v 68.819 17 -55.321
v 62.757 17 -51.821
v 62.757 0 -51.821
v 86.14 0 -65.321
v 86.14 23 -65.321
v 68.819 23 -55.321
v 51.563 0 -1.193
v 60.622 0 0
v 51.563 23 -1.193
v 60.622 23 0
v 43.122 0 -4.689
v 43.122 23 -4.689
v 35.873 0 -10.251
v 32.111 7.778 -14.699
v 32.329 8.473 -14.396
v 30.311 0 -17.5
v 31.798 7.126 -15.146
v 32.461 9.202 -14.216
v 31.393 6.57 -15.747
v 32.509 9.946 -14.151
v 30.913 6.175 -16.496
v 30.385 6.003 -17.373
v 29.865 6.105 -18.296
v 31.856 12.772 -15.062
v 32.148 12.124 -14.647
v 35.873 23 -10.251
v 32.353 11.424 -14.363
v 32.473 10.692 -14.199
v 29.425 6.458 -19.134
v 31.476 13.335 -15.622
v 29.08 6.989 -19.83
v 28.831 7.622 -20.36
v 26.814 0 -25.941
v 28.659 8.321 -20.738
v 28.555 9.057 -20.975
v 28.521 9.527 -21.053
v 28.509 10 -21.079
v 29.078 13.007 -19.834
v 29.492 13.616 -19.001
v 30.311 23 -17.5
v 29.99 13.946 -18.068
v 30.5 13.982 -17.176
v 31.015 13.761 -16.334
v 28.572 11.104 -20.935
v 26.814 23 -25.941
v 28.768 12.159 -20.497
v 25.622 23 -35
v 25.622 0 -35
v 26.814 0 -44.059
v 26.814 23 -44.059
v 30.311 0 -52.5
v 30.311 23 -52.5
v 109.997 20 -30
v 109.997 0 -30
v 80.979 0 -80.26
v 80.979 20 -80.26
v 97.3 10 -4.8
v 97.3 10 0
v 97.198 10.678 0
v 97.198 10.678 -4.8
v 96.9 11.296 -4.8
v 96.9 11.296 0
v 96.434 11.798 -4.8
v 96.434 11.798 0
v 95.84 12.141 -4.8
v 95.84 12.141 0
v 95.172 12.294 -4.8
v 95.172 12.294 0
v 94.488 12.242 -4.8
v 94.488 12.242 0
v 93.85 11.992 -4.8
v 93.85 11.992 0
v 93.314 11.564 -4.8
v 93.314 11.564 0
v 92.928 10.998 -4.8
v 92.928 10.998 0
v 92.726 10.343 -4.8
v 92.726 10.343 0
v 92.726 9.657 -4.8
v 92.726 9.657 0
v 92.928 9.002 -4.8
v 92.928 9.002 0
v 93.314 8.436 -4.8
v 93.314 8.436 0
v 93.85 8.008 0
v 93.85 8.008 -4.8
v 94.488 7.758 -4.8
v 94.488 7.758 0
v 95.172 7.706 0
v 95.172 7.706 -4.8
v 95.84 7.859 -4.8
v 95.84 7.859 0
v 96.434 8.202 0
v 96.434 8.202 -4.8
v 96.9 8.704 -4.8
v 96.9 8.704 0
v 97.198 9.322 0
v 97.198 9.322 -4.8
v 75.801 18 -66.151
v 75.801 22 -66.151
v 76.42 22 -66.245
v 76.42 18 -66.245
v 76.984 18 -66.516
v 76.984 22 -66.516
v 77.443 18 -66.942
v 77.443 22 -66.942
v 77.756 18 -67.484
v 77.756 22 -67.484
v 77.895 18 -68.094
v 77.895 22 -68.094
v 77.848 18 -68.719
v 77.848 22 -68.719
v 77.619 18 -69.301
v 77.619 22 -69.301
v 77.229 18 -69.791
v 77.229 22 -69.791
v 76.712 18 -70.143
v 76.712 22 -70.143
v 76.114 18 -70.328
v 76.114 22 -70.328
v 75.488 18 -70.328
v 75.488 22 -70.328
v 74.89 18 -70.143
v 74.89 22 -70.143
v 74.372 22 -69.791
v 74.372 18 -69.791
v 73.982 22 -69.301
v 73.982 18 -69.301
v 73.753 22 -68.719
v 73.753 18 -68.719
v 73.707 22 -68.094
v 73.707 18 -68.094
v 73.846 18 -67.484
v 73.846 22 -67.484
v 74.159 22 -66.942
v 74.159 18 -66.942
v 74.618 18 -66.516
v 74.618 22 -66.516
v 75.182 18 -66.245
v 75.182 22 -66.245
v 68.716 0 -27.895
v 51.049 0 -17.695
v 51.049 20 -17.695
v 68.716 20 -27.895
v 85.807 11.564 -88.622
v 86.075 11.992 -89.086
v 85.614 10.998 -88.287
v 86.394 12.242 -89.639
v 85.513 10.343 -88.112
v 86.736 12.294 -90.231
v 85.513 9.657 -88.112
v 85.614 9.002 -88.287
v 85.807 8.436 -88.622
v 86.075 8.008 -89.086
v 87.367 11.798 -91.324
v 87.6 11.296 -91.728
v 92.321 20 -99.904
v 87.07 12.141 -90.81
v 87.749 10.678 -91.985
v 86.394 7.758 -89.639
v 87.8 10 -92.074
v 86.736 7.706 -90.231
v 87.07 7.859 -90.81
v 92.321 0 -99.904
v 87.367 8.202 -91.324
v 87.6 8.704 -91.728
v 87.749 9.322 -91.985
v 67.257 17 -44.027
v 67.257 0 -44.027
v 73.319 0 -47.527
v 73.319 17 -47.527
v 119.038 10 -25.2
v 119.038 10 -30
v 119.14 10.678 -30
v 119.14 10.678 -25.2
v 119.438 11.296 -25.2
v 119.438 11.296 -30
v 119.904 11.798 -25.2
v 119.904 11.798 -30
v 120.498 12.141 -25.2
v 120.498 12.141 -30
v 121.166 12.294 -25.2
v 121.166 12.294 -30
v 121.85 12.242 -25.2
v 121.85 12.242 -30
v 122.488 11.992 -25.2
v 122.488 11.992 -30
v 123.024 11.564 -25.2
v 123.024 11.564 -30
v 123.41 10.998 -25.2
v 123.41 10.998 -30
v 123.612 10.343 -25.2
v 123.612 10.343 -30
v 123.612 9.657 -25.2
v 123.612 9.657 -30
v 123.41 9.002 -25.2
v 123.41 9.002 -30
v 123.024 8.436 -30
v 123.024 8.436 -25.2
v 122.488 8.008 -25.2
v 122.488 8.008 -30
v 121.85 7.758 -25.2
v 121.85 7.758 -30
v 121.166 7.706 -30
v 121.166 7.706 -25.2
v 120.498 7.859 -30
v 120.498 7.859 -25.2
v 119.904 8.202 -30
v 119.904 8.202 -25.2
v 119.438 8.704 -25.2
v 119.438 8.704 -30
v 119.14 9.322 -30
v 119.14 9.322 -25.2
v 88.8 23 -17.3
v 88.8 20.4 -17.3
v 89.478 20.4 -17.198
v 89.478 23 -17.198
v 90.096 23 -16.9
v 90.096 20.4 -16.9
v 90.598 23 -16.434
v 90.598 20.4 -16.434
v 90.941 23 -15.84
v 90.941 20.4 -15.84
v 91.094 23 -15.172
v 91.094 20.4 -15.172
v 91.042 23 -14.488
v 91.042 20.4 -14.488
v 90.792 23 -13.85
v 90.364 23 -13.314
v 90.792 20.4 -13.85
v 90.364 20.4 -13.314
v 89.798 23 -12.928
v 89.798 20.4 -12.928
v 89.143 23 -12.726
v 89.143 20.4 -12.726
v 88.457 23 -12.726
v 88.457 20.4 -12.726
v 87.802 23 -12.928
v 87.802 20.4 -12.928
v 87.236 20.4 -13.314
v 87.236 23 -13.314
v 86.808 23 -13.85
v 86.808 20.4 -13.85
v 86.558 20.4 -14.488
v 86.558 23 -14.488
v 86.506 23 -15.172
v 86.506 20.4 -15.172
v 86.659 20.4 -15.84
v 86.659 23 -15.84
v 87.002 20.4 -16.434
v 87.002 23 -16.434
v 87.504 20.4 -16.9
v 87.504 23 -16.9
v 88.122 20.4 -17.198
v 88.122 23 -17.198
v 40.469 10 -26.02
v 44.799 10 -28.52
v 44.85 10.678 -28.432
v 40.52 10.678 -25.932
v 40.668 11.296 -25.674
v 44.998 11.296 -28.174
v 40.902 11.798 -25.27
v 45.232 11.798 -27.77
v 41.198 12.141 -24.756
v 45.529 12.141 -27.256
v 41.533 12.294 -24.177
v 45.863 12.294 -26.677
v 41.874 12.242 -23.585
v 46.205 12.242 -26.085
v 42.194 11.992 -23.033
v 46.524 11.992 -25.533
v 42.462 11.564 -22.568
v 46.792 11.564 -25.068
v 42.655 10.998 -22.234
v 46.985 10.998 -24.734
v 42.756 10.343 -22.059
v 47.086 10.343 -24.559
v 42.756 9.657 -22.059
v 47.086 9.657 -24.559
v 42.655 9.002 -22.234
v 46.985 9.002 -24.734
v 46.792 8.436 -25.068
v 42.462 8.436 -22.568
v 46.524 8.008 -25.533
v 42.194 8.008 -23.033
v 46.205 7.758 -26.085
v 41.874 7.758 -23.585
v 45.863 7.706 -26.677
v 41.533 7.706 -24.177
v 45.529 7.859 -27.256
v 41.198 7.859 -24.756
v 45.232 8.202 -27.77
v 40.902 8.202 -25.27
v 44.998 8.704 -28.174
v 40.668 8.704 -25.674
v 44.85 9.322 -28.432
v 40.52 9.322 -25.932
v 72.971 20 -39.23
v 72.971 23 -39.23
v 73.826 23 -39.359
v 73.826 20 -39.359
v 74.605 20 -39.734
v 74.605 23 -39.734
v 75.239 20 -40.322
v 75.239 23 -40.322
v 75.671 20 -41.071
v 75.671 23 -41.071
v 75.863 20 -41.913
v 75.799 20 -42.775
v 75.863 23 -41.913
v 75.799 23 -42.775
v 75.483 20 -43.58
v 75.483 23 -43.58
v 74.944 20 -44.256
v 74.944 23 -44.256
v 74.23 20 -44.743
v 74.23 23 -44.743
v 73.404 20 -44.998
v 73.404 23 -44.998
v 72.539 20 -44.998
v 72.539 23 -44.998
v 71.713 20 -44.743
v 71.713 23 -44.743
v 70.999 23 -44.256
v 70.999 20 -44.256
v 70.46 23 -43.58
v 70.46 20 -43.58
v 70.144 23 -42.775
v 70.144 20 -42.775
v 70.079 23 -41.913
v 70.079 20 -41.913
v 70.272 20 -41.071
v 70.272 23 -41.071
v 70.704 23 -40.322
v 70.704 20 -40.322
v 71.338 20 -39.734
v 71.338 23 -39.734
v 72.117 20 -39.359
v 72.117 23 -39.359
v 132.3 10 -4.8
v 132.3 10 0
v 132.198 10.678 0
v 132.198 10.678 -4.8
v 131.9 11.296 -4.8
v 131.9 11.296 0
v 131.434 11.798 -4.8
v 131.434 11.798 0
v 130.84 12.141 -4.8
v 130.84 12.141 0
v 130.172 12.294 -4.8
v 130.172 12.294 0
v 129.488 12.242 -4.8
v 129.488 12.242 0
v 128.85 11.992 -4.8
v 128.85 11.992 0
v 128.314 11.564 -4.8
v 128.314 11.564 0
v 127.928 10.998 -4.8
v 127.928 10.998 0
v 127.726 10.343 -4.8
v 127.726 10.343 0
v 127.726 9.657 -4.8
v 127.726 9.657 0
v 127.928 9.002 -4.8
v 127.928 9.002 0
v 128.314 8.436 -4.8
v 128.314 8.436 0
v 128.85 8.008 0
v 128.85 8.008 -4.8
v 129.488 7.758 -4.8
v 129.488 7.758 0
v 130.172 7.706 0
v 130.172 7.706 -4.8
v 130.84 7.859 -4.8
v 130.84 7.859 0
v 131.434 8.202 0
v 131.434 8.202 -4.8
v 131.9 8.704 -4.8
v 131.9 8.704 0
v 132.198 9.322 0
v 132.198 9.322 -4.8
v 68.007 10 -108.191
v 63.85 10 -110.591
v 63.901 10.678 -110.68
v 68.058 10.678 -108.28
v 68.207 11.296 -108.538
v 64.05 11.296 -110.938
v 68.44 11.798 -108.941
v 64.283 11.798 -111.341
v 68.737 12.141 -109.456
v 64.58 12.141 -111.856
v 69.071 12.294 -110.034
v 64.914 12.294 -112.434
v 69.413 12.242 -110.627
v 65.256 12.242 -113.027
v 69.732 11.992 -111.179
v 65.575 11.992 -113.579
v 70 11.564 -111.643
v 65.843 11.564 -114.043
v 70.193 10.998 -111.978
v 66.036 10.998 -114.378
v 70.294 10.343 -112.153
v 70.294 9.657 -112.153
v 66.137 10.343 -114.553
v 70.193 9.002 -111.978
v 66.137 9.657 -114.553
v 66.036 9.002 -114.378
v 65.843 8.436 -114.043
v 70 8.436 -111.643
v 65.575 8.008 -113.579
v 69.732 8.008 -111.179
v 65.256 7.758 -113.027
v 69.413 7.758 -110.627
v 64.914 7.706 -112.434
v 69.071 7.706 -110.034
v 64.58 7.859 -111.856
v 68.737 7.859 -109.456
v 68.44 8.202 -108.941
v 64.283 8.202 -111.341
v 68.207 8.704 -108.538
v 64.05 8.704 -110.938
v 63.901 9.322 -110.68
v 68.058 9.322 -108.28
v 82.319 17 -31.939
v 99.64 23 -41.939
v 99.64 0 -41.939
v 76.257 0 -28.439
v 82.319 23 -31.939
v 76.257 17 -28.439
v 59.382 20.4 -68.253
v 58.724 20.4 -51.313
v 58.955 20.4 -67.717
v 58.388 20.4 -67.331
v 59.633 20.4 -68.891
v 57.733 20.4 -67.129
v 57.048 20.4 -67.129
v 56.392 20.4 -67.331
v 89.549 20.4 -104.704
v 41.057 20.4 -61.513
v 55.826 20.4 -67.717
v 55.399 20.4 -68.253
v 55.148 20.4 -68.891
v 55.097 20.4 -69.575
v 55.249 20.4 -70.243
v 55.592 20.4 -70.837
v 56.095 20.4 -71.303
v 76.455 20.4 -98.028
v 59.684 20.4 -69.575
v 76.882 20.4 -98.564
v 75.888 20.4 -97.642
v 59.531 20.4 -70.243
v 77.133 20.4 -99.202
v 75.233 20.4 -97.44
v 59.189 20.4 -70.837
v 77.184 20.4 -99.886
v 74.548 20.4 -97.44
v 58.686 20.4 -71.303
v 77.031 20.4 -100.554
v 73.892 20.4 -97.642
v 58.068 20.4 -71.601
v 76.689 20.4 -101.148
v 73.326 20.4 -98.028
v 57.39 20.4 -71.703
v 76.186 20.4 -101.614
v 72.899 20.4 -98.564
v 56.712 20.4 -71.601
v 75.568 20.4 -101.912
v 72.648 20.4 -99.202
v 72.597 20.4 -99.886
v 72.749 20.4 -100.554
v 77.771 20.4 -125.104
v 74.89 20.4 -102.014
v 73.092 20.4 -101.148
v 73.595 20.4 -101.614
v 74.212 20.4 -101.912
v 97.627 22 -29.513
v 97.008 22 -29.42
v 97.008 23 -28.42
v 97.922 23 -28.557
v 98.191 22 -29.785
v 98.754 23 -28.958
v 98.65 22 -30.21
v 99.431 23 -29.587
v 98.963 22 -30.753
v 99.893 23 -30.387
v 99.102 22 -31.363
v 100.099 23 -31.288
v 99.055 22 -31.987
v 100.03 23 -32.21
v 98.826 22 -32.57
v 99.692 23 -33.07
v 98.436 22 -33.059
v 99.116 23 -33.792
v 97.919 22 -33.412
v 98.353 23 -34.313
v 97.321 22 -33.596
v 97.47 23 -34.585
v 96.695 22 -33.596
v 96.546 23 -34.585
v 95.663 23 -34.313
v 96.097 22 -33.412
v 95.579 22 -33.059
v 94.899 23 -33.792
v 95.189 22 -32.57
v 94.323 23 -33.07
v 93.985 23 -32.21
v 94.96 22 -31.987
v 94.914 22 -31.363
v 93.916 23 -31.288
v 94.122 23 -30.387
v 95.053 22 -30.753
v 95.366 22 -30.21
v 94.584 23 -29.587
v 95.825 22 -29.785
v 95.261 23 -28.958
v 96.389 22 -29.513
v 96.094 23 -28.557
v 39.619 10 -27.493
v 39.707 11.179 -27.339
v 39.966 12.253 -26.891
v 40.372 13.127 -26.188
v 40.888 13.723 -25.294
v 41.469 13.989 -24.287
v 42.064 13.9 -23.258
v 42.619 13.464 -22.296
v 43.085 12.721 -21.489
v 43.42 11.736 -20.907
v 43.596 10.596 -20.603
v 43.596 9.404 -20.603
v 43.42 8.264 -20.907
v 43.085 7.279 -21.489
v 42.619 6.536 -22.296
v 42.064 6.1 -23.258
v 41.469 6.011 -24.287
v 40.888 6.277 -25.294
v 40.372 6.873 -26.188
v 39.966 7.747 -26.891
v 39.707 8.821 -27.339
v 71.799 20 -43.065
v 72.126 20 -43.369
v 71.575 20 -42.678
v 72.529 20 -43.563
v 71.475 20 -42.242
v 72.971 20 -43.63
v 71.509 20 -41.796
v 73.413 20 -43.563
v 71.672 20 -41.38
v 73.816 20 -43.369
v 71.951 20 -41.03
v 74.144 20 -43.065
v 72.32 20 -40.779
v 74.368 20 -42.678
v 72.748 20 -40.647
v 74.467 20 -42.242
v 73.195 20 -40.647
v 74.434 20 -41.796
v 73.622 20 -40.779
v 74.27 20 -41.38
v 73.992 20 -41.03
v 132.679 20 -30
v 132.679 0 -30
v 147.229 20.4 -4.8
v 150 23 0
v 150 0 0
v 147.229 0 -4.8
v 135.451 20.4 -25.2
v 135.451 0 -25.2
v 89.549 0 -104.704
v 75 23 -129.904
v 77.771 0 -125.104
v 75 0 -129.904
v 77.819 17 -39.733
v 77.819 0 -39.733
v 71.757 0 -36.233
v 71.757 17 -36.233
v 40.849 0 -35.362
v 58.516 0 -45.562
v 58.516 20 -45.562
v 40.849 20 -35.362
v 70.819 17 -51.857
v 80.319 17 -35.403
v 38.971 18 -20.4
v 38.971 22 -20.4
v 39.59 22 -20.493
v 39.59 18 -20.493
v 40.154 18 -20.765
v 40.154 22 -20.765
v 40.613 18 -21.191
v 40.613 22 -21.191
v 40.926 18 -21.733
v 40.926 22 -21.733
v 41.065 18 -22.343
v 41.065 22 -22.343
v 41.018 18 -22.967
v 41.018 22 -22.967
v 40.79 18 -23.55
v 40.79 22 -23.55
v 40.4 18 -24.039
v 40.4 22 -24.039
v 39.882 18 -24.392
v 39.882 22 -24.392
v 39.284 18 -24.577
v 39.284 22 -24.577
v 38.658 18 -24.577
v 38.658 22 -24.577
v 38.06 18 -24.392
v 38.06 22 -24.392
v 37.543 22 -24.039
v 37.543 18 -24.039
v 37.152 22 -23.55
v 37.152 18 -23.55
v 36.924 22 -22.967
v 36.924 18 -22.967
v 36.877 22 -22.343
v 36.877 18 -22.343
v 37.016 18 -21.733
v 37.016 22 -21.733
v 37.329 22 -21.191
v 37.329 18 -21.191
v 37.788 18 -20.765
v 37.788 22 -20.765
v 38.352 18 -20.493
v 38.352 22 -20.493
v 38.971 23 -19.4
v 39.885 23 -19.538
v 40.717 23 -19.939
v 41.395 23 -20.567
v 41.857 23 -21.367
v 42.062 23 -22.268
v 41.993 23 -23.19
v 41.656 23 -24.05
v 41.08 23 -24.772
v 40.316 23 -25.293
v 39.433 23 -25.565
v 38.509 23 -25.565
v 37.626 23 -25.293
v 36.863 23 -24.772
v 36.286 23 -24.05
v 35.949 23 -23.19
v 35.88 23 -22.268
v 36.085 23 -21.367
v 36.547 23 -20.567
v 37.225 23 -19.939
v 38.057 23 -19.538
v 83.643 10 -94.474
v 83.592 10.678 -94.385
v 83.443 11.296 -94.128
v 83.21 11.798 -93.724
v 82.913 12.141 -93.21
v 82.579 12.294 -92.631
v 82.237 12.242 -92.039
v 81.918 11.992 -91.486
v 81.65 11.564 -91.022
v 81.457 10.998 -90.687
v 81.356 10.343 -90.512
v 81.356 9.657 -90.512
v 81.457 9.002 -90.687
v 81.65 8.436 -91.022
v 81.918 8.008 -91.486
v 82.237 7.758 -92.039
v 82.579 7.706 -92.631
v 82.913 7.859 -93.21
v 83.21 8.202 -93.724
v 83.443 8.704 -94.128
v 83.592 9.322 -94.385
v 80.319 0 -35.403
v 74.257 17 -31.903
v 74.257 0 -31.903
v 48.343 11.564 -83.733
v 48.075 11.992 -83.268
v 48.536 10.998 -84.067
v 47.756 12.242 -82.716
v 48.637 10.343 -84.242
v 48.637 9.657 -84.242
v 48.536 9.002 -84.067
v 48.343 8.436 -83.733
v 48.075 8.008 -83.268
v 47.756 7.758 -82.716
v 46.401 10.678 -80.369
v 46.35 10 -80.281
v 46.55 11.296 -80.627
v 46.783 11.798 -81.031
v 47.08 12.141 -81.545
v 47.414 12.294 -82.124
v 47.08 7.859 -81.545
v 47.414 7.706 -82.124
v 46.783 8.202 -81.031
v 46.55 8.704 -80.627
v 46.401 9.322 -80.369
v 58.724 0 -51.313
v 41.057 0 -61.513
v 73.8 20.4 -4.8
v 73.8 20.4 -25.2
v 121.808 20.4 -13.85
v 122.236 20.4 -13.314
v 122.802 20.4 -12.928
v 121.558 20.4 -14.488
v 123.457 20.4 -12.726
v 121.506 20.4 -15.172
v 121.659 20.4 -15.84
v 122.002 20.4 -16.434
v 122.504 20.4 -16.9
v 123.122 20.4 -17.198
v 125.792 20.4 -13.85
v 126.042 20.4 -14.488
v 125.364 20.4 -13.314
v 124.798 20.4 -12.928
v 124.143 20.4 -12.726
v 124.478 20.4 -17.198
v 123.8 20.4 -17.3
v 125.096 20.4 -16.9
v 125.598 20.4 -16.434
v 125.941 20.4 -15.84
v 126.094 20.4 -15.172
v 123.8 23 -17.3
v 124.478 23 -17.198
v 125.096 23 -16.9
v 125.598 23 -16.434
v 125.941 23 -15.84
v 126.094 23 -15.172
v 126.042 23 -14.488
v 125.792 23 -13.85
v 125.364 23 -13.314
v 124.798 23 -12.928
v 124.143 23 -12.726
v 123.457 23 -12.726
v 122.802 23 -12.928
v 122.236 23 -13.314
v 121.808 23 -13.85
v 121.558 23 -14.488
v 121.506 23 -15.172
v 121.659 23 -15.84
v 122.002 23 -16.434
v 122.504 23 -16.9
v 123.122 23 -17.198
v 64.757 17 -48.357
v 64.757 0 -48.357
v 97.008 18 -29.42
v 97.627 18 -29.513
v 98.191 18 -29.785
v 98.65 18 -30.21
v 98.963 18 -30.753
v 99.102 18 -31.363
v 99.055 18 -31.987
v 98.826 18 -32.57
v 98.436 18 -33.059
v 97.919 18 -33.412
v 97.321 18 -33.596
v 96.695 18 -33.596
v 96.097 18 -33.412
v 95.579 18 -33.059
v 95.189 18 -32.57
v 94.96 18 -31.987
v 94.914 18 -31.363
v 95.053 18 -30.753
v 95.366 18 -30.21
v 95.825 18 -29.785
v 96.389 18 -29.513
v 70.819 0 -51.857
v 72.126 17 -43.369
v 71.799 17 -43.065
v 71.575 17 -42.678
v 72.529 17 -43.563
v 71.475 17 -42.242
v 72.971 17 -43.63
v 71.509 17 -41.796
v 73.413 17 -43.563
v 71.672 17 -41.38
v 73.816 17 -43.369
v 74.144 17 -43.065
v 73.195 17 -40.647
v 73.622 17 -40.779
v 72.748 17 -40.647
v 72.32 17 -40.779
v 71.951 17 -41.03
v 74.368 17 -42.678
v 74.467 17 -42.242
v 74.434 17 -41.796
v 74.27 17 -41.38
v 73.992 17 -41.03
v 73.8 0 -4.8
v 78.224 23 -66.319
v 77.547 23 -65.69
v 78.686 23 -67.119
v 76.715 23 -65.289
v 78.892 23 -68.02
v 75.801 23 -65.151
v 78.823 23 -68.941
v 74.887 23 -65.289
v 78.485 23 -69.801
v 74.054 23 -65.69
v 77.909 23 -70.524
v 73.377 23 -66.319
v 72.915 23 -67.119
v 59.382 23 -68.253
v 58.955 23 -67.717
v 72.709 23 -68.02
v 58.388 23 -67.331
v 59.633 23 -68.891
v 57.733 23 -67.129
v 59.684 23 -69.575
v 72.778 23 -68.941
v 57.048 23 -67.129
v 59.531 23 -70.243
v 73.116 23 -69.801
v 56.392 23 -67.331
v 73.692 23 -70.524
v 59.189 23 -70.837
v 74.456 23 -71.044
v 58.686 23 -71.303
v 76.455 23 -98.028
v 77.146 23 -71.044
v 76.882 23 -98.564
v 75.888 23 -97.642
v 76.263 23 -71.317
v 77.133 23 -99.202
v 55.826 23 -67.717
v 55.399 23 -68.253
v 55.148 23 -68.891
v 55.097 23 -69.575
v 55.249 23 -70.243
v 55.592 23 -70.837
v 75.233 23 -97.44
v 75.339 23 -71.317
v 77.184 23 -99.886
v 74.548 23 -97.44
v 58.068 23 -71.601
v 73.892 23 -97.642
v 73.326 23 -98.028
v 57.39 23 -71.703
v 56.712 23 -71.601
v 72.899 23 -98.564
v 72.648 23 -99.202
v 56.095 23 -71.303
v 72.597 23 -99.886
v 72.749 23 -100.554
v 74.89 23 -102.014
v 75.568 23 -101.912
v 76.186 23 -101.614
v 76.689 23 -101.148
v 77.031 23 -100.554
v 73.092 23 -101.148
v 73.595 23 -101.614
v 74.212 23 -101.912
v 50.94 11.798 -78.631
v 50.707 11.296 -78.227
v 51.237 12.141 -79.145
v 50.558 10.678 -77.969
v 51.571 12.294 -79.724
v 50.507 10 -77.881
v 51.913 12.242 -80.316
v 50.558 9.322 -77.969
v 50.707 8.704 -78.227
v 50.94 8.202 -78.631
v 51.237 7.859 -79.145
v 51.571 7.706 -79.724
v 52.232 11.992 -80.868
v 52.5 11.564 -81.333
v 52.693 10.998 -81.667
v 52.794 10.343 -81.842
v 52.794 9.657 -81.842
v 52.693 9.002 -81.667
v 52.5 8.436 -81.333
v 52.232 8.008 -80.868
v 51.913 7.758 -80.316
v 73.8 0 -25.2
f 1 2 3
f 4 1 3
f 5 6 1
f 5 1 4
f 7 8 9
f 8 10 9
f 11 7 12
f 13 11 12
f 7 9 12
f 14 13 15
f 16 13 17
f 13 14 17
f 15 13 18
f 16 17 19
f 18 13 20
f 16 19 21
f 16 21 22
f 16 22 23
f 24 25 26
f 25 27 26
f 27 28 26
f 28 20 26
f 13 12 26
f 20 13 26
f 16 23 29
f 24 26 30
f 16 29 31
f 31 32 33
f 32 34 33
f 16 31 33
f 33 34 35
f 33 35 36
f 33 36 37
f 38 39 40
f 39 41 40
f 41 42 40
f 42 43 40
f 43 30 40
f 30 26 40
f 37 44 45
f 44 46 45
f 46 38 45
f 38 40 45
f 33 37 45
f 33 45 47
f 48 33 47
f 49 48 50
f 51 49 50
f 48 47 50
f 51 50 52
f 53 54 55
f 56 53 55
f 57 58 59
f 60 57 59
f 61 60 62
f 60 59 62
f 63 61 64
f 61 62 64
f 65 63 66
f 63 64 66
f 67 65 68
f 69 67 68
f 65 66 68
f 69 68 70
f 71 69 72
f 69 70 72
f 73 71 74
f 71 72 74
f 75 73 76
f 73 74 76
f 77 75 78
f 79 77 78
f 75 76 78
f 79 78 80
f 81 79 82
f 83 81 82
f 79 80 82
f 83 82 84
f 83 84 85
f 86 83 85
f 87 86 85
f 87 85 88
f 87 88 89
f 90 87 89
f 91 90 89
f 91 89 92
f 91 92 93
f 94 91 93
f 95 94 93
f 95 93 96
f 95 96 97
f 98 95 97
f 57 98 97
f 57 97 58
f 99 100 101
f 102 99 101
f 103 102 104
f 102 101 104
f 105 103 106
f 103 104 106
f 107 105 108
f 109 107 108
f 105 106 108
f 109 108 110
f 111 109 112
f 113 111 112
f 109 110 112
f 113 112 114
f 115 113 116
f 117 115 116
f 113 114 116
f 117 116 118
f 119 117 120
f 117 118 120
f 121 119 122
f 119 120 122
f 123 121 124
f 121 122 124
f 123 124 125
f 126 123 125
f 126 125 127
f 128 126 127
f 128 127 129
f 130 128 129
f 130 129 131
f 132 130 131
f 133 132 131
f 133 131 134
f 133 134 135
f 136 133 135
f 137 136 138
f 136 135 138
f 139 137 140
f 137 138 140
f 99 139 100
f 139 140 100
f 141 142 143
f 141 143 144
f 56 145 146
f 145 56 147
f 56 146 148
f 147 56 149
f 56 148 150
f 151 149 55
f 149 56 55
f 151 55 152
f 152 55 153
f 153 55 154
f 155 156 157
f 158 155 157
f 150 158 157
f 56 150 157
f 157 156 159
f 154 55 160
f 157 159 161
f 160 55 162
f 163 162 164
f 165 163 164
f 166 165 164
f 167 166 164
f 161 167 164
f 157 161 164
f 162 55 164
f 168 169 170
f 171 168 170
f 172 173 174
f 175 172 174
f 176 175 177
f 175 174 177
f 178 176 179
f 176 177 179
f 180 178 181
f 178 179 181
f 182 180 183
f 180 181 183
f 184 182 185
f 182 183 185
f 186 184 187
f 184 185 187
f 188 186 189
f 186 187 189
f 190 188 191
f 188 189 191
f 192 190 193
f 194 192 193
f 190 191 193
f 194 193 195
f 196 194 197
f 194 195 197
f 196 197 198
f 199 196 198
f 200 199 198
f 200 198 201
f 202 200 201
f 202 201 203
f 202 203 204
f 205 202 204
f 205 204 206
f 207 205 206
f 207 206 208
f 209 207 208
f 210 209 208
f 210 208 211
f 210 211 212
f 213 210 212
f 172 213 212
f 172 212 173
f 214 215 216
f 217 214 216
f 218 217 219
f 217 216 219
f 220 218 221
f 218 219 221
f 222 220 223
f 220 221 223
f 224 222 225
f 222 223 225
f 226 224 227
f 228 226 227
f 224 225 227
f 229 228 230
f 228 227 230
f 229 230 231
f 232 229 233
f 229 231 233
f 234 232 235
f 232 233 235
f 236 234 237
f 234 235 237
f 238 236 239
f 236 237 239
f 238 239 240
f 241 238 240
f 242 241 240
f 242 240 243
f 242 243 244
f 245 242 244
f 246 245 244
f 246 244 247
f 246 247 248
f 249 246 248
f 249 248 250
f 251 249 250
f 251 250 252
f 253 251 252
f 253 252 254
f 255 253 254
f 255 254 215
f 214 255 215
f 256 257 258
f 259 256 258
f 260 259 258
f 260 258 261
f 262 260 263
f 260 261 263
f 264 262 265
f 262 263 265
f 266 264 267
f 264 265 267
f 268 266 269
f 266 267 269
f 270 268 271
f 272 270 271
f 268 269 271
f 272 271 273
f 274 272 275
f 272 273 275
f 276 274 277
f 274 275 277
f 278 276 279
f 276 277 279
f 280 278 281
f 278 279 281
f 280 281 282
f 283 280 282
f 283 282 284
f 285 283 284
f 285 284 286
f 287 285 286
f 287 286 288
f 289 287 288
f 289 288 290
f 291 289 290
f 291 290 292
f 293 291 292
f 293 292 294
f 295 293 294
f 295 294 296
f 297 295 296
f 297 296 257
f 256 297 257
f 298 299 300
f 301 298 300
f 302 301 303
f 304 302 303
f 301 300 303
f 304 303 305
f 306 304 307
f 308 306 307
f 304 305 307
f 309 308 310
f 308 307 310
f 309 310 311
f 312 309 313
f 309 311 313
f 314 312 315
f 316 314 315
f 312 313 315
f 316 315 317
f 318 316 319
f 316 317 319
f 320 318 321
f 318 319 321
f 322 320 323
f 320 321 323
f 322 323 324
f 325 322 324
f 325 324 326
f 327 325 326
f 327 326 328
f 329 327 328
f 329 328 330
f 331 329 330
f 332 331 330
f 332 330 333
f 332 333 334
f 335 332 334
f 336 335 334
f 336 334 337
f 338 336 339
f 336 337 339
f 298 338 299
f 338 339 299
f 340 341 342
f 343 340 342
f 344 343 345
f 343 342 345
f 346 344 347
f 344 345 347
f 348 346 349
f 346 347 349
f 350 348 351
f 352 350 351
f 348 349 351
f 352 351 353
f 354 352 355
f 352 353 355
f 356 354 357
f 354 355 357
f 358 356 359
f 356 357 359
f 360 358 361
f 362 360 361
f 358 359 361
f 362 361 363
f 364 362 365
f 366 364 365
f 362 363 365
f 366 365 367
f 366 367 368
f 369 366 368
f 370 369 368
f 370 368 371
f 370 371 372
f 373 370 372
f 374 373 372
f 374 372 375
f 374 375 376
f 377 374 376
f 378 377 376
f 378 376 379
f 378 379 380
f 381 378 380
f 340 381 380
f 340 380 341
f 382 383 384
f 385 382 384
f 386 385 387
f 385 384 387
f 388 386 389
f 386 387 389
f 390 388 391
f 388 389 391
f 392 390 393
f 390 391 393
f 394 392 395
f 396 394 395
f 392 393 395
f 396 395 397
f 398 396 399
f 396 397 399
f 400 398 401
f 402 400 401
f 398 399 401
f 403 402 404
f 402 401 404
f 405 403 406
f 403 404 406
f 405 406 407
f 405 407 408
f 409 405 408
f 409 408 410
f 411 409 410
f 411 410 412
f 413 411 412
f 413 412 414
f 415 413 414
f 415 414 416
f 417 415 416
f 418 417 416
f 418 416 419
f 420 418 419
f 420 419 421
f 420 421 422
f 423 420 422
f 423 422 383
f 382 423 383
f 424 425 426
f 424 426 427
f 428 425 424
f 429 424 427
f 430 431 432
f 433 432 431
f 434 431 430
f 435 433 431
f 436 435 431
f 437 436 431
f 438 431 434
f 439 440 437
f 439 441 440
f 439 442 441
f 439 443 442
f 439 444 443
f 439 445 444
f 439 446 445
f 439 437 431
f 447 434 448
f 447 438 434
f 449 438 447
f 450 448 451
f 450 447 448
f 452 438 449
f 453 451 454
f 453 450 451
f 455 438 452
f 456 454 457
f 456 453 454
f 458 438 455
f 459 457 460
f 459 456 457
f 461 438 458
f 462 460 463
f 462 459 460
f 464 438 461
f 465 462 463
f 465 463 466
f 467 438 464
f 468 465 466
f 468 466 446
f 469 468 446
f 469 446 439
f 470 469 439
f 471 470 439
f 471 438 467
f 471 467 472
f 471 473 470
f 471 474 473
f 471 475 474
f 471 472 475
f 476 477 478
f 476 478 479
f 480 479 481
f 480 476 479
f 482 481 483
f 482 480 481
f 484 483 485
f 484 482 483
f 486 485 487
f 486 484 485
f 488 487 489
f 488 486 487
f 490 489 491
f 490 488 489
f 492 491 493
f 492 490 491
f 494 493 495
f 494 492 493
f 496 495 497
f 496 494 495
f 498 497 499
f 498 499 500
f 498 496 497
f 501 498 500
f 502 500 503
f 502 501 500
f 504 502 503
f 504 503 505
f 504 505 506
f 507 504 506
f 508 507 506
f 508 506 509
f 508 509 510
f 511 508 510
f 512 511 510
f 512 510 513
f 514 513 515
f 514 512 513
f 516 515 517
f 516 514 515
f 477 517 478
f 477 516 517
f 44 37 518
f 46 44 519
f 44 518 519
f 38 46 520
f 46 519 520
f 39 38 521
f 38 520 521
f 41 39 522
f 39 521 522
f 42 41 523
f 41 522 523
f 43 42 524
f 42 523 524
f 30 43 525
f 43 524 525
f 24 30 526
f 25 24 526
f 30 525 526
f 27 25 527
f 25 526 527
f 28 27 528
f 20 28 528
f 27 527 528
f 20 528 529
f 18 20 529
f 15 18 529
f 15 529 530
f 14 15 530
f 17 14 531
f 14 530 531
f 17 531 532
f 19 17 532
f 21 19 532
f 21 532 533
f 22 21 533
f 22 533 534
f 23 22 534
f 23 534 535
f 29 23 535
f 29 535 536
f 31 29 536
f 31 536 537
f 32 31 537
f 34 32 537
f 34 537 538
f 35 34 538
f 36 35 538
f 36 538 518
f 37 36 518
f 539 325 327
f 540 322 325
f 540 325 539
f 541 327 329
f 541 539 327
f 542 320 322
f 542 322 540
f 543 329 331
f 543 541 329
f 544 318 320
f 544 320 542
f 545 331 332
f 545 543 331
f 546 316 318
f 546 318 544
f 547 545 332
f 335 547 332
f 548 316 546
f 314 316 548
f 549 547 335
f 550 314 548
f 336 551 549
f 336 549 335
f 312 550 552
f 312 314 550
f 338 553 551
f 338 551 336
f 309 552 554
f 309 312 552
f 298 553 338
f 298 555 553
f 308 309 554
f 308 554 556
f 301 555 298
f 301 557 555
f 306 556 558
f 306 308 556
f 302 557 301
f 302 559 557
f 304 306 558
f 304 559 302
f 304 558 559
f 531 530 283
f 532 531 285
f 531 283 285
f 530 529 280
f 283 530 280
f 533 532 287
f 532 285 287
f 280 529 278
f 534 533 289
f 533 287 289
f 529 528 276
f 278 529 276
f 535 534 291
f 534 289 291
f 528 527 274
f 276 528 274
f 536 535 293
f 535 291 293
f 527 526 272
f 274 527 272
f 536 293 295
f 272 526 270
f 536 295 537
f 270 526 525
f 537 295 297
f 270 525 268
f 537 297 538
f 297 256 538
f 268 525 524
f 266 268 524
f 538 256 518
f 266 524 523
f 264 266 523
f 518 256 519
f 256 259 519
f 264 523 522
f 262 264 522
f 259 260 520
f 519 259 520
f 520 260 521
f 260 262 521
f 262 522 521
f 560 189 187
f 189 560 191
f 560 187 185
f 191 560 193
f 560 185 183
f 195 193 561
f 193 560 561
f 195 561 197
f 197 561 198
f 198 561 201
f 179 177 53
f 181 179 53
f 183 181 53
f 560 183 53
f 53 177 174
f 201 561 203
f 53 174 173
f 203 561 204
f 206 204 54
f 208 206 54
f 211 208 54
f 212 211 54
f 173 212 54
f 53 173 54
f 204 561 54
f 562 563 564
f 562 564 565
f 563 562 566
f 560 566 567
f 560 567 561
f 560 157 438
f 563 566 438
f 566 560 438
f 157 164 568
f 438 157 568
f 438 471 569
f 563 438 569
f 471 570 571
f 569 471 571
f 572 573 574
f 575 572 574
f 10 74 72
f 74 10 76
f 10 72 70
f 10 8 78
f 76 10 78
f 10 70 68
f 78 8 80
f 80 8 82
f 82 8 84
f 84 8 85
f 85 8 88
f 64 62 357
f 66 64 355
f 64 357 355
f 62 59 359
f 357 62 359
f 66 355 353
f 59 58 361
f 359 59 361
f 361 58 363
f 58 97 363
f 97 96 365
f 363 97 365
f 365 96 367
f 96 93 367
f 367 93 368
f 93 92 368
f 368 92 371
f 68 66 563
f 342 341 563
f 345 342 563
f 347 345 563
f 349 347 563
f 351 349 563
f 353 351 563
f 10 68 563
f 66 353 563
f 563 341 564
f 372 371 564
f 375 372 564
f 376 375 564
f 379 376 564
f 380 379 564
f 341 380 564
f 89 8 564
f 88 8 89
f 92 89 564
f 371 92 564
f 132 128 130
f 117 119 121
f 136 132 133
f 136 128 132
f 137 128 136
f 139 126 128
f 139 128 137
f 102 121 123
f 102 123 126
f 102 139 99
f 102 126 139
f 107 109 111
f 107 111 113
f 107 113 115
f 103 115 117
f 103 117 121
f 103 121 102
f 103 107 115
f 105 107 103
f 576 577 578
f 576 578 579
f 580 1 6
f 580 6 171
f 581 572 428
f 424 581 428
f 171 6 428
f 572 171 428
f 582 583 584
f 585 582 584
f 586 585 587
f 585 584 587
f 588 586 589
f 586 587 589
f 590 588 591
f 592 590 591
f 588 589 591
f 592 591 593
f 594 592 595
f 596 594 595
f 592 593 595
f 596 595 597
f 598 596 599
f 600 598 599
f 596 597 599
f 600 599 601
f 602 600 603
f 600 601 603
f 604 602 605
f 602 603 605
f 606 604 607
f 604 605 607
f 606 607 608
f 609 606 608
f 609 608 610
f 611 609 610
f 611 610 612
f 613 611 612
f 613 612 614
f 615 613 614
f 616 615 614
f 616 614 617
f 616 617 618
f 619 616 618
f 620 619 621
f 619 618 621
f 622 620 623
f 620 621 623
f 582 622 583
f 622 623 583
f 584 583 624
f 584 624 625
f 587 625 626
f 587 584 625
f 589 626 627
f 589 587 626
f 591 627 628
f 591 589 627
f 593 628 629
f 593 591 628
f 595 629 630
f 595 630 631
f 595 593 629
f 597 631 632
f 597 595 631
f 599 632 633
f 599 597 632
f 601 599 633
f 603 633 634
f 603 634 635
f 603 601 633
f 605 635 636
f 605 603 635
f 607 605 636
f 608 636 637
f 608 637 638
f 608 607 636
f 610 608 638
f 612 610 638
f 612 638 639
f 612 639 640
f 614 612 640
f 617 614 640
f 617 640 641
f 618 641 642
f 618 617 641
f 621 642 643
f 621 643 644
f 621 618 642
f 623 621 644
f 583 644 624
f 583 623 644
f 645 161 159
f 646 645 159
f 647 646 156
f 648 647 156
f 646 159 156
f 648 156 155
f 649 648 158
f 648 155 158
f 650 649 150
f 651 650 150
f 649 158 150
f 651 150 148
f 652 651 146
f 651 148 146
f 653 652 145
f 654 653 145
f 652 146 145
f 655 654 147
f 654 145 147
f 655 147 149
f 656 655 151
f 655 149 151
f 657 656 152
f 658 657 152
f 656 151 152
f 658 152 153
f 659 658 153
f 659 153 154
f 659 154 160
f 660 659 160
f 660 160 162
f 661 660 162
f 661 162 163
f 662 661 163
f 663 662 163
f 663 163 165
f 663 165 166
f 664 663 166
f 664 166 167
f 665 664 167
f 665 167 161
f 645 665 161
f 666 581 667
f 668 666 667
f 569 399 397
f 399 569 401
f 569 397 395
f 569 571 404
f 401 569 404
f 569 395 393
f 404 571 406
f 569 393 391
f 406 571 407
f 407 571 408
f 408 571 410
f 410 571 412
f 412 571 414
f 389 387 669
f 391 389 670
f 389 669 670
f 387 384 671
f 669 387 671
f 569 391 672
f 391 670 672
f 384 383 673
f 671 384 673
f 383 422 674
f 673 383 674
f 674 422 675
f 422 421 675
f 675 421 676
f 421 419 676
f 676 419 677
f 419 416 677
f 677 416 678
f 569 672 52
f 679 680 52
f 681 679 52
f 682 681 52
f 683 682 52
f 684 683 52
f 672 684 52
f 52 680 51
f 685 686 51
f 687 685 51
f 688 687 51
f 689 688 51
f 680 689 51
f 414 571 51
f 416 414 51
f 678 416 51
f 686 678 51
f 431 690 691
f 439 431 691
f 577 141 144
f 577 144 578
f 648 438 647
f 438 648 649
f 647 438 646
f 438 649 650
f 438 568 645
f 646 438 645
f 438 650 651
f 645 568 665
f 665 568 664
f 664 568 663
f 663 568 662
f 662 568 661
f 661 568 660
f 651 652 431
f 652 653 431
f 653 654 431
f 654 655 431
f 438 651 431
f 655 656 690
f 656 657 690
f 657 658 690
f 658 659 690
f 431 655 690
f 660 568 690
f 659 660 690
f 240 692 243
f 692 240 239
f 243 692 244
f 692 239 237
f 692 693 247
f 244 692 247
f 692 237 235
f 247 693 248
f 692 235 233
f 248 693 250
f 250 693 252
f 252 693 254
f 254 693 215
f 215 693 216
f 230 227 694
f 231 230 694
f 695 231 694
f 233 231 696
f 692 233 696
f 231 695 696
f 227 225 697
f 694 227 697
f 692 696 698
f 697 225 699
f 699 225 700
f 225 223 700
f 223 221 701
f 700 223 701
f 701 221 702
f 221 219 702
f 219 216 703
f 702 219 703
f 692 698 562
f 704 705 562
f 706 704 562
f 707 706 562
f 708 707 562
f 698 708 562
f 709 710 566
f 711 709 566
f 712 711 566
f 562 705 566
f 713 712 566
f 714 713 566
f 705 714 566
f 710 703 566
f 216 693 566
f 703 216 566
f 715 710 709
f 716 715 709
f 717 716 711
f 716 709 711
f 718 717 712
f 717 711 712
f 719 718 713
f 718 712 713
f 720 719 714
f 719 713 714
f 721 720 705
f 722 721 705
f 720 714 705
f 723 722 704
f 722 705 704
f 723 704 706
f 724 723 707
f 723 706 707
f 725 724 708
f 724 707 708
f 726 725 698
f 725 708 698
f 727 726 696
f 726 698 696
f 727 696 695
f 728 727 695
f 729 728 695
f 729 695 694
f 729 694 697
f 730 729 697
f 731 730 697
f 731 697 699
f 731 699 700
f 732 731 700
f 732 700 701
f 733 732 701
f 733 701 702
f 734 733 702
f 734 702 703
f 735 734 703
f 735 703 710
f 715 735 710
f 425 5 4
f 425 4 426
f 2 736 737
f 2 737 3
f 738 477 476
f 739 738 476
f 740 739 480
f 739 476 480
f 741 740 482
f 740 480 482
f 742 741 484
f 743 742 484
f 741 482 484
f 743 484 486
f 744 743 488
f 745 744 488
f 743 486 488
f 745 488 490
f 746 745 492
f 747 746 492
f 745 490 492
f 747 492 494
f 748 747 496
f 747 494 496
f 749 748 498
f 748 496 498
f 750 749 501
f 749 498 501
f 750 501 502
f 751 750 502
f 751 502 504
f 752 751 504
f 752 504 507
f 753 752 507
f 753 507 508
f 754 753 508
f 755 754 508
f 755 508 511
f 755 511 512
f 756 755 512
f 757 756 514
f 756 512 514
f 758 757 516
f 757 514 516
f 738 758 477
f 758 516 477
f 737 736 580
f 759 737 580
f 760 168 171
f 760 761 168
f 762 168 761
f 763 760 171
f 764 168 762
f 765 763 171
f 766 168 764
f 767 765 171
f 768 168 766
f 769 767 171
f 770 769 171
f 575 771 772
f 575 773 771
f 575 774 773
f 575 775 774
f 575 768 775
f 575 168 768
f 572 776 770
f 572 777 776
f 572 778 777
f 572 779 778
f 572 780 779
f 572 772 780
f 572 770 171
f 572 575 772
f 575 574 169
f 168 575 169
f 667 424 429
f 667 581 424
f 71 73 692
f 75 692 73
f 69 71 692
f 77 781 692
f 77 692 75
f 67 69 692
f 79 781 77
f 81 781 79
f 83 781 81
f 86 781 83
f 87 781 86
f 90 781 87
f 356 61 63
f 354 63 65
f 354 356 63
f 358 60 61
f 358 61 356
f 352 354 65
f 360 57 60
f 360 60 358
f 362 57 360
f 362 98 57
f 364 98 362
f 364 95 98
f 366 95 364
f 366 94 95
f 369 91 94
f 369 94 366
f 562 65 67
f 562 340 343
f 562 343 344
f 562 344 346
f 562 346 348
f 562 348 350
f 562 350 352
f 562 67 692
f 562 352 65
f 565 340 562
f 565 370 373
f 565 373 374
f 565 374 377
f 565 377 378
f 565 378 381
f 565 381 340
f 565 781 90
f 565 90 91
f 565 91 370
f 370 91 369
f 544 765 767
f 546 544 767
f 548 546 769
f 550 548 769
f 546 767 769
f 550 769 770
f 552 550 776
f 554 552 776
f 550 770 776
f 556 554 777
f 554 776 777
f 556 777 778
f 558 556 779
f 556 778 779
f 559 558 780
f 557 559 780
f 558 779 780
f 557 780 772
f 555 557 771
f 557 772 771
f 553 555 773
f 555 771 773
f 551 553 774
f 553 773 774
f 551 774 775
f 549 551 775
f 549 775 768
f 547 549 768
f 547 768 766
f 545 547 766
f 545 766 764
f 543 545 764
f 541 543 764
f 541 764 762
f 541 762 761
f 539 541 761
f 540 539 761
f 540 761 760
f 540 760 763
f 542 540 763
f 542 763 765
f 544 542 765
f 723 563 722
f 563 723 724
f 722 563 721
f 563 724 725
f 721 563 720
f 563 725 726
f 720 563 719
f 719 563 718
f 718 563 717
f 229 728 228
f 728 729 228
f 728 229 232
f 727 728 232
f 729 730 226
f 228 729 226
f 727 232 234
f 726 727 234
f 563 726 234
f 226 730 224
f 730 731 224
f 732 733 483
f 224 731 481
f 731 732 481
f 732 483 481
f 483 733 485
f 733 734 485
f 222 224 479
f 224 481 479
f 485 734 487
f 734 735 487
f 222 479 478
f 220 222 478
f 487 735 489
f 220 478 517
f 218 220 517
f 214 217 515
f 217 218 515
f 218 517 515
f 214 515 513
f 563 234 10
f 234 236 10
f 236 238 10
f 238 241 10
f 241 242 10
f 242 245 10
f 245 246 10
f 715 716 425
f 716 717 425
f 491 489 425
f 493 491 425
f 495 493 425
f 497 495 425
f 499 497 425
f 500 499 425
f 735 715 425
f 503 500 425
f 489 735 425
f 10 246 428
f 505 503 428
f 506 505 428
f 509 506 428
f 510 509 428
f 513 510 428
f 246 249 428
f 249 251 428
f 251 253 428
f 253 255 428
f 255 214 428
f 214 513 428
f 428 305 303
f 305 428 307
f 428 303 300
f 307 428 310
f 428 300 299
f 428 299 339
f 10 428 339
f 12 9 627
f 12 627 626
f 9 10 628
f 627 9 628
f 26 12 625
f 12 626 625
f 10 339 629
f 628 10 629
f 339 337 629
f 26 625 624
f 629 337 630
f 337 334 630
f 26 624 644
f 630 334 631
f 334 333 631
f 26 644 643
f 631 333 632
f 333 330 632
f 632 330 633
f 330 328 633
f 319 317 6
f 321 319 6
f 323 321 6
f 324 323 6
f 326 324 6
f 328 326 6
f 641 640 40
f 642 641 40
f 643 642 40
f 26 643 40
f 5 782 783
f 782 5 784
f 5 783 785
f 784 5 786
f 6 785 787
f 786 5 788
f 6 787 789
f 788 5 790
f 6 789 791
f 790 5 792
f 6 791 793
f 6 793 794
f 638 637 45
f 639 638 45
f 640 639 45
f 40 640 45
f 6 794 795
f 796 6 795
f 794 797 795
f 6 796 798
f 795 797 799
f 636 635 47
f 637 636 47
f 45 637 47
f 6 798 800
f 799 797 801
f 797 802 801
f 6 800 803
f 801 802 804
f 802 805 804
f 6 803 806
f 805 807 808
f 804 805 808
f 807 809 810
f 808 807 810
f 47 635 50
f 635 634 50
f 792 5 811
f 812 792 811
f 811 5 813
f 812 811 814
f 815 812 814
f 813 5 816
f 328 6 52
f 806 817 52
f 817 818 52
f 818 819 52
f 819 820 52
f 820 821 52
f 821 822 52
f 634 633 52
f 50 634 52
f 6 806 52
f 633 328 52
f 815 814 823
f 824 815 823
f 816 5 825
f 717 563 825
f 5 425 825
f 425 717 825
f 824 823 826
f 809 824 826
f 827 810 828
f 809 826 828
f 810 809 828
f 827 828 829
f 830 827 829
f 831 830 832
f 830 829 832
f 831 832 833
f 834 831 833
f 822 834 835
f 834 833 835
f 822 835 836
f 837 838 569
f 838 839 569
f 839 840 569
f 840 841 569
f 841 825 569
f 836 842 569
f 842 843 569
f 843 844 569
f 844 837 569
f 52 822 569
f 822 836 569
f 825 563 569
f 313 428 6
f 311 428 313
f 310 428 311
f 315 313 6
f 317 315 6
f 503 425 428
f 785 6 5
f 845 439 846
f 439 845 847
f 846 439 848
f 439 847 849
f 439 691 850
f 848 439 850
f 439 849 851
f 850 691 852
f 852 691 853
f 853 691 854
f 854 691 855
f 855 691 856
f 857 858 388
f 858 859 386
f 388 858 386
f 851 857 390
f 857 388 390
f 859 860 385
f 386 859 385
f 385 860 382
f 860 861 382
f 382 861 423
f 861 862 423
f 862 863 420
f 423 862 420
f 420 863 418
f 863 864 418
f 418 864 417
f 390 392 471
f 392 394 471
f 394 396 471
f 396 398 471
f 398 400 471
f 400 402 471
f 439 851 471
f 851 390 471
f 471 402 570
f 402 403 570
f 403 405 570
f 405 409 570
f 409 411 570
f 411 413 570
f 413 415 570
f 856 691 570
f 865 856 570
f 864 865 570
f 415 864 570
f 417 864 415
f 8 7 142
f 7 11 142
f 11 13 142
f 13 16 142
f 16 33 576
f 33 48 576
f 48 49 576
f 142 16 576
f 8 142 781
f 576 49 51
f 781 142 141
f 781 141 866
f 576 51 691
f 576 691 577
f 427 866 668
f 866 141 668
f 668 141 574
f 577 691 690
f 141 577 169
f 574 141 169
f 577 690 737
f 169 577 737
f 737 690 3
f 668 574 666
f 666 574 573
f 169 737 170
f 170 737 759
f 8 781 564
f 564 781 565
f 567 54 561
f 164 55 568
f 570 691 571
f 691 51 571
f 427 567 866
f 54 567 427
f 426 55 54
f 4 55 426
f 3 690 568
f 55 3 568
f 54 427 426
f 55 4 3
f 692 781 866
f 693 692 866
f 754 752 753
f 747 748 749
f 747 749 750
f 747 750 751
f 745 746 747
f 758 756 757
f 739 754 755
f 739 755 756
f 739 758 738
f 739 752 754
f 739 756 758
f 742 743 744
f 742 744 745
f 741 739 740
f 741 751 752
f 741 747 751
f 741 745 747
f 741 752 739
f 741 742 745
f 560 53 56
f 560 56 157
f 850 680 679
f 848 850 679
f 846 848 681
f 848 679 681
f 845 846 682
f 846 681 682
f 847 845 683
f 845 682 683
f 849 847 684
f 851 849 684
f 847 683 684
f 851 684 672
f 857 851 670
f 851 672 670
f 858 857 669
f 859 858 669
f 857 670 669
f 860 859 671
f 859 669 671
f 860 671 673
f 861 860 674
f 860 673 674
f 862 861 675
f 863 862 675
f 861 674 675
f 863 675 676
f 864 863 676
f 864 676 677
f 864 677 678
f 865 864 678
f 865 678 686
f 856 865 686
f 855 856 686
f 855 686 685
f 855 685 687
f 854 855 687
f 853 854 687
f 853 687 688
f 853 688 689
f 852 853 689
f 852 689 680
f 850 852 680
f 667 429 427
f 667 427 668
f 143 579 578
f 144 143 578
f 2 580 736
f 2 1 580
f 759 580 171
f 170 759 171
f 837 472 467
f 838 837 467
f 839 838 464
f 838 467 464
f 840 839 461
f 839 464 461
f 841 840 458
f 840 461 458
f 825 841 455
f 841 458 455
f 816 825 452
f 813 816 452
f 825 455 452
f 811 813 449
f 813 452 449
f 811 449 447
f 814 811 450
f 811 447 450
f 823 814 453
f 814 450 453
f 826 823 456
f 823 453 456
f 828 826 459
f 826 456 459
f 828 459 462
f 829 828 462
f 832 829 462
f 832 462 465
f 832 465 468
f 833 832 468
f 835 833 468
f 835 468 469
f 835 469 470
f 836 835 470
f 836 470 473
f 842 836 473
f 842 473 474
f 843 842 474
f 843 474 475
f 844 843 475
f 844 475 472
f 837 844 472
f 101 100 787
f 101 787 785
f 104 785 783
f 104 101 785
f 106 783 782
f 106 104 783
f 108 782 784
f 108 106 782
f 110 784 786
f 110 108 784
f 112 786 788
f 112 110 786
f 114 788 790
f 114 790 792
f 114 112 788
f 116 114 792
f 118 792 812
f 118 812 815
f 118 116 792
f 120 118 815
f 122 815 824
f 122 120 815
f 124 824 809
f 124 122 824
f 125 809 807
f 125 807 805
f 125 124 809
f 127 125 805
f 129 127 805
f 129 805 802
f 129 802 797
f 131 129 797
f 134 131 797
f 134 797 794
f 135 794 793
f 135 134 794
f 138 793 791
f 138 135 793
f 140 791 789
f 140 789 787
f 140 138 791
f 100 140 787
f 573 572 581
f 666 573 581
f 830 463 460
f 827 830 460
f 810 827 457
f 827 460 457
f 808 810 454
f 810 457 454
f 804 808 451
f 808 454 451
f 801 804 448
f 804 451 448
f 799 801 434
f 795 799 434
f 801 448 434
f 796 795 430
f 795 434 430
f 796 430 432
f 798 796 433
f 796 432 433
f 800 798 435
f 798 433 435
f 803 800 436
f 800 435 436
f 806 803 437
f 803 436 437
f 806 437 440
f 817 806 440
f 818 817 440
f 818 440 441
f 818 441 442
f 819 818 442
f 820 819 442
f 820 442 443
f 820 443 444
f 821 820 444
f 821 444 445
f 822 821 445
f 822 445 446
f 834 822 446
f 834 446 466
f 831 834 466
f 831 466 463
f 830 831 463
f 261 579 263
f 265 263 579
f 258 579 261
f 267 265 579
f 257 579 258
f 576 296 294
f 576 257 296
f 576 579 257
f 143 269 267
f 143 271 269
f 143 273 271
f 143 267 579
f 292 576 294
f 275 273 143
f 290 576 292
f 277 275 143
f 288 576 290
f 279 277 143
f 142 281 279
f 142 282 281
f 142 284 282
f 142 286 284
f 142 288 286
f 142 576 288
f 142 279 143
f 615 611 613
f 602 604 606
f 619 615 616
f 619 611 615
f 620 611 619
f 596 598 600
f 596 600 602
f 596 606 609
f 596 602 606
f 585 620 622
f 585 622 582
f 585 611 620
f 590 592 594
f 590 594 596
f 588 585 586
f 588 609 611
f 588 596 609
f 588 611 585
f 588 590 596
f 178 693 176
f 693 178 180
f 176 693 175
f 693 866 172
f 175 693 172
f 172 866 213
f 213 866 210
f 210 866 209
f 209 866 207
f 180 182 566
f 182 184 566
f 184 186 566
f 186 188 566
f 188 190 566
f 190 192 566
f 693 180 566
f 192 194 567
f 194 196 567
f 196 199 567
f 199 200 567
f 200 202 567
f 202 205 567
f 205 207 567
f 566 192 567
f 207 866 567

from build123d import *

# Parameters (mm, degrees)
BOSS_EXTRUDE1_DEPTH      = 23
SKETCH2_W                = 100.4
SKETCH2_H                = 20.4
CUT_EXTRUDE2_DEPTH       = 20.4
CUT_EXTRUDE3_DEPTH       = 20
SKETCH7_R                = 2.3
CUT_EXTRUDE6_DEPTH       = 10
SKETCH8_R                = 2.3
CUT_EXTRUDE7_DEPTH       = 10
FILLET3_R                = 35
CUT_EXTRUDE11_DEPTH      = 200.759855827
CUT_EXTRUDE11_DEPTH_BACK = 200.759855827
CUT_EXTRUDE10_DEPTH      = 20
BOSS_EXTRUDE3_DEPTH      = 6
BOSS_EXTRUDE4_DEPTH      = 17
CUT_EXTRUDE14_DEPTH      = 17
SKETCH30_R               = 1.5
CUT_EXTRUDE15_DEPTH      = 200.158228552
SKETCH31_R               = 2.9
CUT_EXTRUDE17_DEPTH      = 3
SKETCH32_R               = 2.3
CUT_EXTRUDE18_DEPTH      = 10
SKETCH33_R               = 2.3
CUT_EXTRUDE19_DEPTH      = 10
SKETCH34_R               = 2.3
CUT_EXTRUDE20_DEPTH      = 149.465956609
SKETCH35_R               = 4
CUT_EXTRUDE21_DEPTH      = 154.248582194
SKETCH36_R               = 2.1
CUT_EXTRUDE22_DEPTH      = 5
SKETCH37_R               = 2.1
CUT_EXTRUDE23_DEPTH      = 5
SKETCH38_R               = 2.3
CUT_EXTRUDE24_DEPTH      = 10
CHAMFER1_SIZE            = 1


with BuildPart() as part:
    # Sketch1 → Boss-Extrude1 (new body)
    with BuildSketch(Plane(origin=(0, 0, 0), x_dir=(1, 0, 0), z_dir=(0, 1, 0))):
        Polygon((0, 0), (150, 0), (75, 129.903810568), align=None)
    extrude(amount=BOSS_EXTRUDE1_DEPTH)

    # Sketch2 → Cut-Extrude2 (cut)
    with BuildSketch(Plane(origin=(0, 0, 0), x_dir=(1, 0, 0), z_dir=(0, 1, 0))):
        Polygon((108.923840175, 138.261625339), (58.723840175, 51.312674799), (41.056921938, 61.512674799), (91.256921938, 148.461625339), align=None)
        with Locations((124, 15)):
            Rectangle(SKETCH2_W, SKETCH2_H)
    extrude(amount=CUT_EXTRUDE2_DEPTH, mode=Mode.SUBTRACT)

    # Sketch4 → Cut-Extrude3 (cut)
    with BuildSketch(Plane(origin=(0, 0, 0), x_dir=(1, 0, 0), z_dir=(0, 1, 0))):
        Polygon((58.515583945, 45.561933634), (40.848665708, 35.361933634), (51.048665708, 17.695015397), (68.715583945, 27.895015397), align=None)
    extrude(amount=CUT_EXTRUDE3_DEPTH, mode=Mode.SUBTRACT)

    # Sketch7 → Cut-Extrude6 (cut)
    with BuildSketch(Plane(origin=(0, 0, 0), x_dir=(-0.4999999999999978, 0, 0.86602540378444), z_dir=(-0.86602540378444, 0, -0.4999999999999978))):
        with Locations((-130, 10)):
            Circle(SKETCH7_R)
        with Locations((-95, 10)):
            Circle(SKETCH7_R)
    extrude(amount=-CUT_EXTRUDE6_DEPTH, mode=Mode.SUBTRACT)

    # Sketch8 → Cut-Extrude7 (cut)
    with BuildSketch(Plane.XY):
        with Locations((130, 10)):
            Circle(SKETCH8_R)
        with Locations((95, 10)):
            Circle(SKETCH8_R)
    extrude(amount=-CUT_EXTRUDE7_DEPTH, mode=Mode.SUBTRACT)

    # Fillet3
    fillet3_edges = [part.edges().sort_by_distance(p)[0] for p in [
        (0, 11.5, 0),
    ]]
    fillet(fillet3_edges, radius=FILLET3_R)

    # Sketch22 → Cut-Extrude11 (cut, two sides: drawn at the far end of the back side and taken through both)
    with BuildSketch(Plane.XZ.offset(-CUT_EXTRUDE11_DEPTH_BACK)):
        Polygon((76.257198908, -28.438657049), (62.757198908, -51.821342951), (86.13988481, -65.321342951), (99.63988481, -41.938657049), align=None)
    extrude(amount=CUT_EXTRUDE11_DEPTH + CUT_EXTRUDE11_DEPTH_BACK, mode=Mode.SUBTRACT)

    # Sketch21 → Cut-Extrude10 (cut)
    with BuildSketch(Plane.XZ):
        Polygon((132.679491924, -30), (109.996773286, -30), (80.979148757, -80.26), (92.320508076, -99.903810568), align=None)
    extrude(amount=-CUT_EXTRUDE10_DEPTH, mode=Mode.SUBTRACT)

    # Sketch27 → Boss-Extrude3 (add)
    with BuildSketch(Plane(origin=(0, 23, 0), x_dir=(1, 0, 0), z_dir=(0, 1, 0))):
        Polygon((76.257198908, 28.438657049), (62.757198908, 51.821342951), (68.819376734, 55.321342951), (82.319376734, 31.938657049), align=None)
    extrude(amount=-BOSS_EXTRUDE3_DEPTH)

    # Sketch28 → Boss-Extrude4 (add)
    with BuildSketch(Plane.XZ.offset(-17)):
        Polygon((74.257198908, -31.902758664), (64.757198908, -48.357241336), (70.819376734, -51.857241336), (80.319376734, -35.402758664), align=None)
    extrude(amount=BOSS_EXTRUDE4_DEPTH)

    # Sketch29 → Cut-Extrude14 (cut)
    with BuildSketch(Plane.XZ):
        Polygon((77.819376734, -39.732885683), (71.757198908, -36.232885683), (67.257198908, -44.027114317), (73.319376734, -47.527114317), align=None)
    extrude(amount=-CUT_EXTRUDE14_DEPTH, mode=Mode.SUBTRACT)

    # Sketch30 → Cut-Extrude15 (cut, through all)
    with BuildSketch(Plane.XZ.offset(-17)):
        with Locations(Location((72.971300523, -42.13, 0), (0, 0, 270))):
            Circle(SKETCH30_R)
    extrude(amount=-CUT_EXTRUDE15_DEPTH, mode=Mode.SUBTRACT)

    # Sketch31 → Cut-Extrude17 (cut)
    with BuildSketch(Plane(origin=(0, 23, 0), x_dir=(1, 0, 0), z_dir=(0, 1, 0))):
        with Locations(Location((72.971300523, 42.13, 0), (0, 0, 270))):
            Circle(SKETCH31_R)
    extrude(amount=-CUT_EXTRUDE17_DEPTH, mode=Mode.SUBTRACT)

    # Sketch32 → Cut-Extrude18 (cut)
    with BuildSketch(Plane(origin=(0, 0, -30), x_dir=(-1, 0, 0), z_dir=(0, 0, -1))):
        with Locations((-121.338132605, 10)):
            Circle(SKETCH32_R)
    extrude(amount=-CUT_EXTRUDE18_DEPTH, mode=Mode.SUBTRACT)

    # Sketch33 → Cut-Extrude19 (cut)
    with BuildSketch(Plane(origin=(25.980762114, 0, 15), x_dir=(0.4999999999999997, 0, -0.8660254037844388), z_dir=(0.8660254037844389, 0, 0.49999999999999983))):
        with Locations((121.338132605, 10)):
            Circle(SKETCH33_R)
    extrude(amount=-CUT_EXTRUDE19_DEPTH, mode=Mode.SUBTRACT)

    # Sketch34 → Cut-Extrude20 (cut, through all)
    with BuildSketch(Plane(origin=(45.948665708, 0, -26.528474516), x_dir=(-0.5000000000000001, 0, -0.8660254037844386), z_dir=(0.8660254037844386, 0, -0.5000000000000001))):
        with Locations((0, 10)):
            Circle(SKETCH34_R)
    extrude(amount=-CUT_EXTRUDE20_DEPTH, mode=Mode.SUBTRACT)

    # Sketch35 → Cut-Extrude21 (cut, through all)
    with BuildSketch(Plane(origin=(41.618538689, 0, -24.028474516), x_dir=(-0.5000000000000001, 0, -0.8660254037844386), z_dir=(0.8660254037844386, 0, -0.5000000000000001))):
        with Locations((0, 10)):
            Circle(SKETCH35_R)
    extrude(amount=-CUT_EXTRUDE21_DEPTH, mode=Mode.SUBTRACT)

    # Sketch36 → Cut-Extrude22 (cut)
    with BuildSketch(Plane(origin=(0, 23, 0), x_dir=(1, 0, 0), z_dir=(0, 1, 0))):
        with Locations(Location((38.97114317, 22.5, 0), (0, 0, 270))):
            Circle(SKETCH36_R)
    extrude(amount=-CUT_EXTRUDE22_DEPTH, mode=Mode.SUBTRACT)

    # Sketch37 → Cut-Extrude23 (cut)
    with BuildSketch(Plane(origin=(0, 23, 0), x_dir=(1, 0, 0), z_dir=(0, 1, 0))):
        with Locations(Location((97.007764662, 31.519733426, 0), (0, 0, 270))):
            Circle(SKETCH37_R)
        with Locations(Location((75.800772199, 68.251321849, 0), (0, 0, 270))):
            Circle(SKETCH37_R)
    extrude(amount=-CUT_EXTRUDE23_DEPTH, mode=Mode.SUBTRACT)

    # Sketch38 → Cut-Extrude24 (cut)
    with BuildSketch(Plane.XZ.offset(-20.4)):
        with Locations(Location((88.8, -15, 0), (0, 0, 270))):
            Circle(SKETCH38_R)
        with Locations(Location((123.8, -15, 0), (0, 0, 270))):
            Circle(SKETCH38_R)
        with Locations(Location((57.390381057, -69.403055856, 0), (0, 0, 270))):
            Circle(SKETCH38_R)
        with Locations(Location((74.890381057, -99.713944989, 0), (0, 0, 270))):
            Circle(SKETCH38_R)
    extrude(amount=-CUT_EXTRUDE24_DEPTH, mode=Mode.SUBTRACT)

    # Chamfer1
    chamfer1_edges = [part.edges().sort_by_distance(p)[0] for p in [
        (38.97114317, 23, -24.6),
        (97.007764662, 23, -33.619733426),
        (75.800772199, 23, -70.351321849),
    ]]
    chamfer(chamfer1_edges, length=CHAMFER1_SIZE)


solid = part.part
